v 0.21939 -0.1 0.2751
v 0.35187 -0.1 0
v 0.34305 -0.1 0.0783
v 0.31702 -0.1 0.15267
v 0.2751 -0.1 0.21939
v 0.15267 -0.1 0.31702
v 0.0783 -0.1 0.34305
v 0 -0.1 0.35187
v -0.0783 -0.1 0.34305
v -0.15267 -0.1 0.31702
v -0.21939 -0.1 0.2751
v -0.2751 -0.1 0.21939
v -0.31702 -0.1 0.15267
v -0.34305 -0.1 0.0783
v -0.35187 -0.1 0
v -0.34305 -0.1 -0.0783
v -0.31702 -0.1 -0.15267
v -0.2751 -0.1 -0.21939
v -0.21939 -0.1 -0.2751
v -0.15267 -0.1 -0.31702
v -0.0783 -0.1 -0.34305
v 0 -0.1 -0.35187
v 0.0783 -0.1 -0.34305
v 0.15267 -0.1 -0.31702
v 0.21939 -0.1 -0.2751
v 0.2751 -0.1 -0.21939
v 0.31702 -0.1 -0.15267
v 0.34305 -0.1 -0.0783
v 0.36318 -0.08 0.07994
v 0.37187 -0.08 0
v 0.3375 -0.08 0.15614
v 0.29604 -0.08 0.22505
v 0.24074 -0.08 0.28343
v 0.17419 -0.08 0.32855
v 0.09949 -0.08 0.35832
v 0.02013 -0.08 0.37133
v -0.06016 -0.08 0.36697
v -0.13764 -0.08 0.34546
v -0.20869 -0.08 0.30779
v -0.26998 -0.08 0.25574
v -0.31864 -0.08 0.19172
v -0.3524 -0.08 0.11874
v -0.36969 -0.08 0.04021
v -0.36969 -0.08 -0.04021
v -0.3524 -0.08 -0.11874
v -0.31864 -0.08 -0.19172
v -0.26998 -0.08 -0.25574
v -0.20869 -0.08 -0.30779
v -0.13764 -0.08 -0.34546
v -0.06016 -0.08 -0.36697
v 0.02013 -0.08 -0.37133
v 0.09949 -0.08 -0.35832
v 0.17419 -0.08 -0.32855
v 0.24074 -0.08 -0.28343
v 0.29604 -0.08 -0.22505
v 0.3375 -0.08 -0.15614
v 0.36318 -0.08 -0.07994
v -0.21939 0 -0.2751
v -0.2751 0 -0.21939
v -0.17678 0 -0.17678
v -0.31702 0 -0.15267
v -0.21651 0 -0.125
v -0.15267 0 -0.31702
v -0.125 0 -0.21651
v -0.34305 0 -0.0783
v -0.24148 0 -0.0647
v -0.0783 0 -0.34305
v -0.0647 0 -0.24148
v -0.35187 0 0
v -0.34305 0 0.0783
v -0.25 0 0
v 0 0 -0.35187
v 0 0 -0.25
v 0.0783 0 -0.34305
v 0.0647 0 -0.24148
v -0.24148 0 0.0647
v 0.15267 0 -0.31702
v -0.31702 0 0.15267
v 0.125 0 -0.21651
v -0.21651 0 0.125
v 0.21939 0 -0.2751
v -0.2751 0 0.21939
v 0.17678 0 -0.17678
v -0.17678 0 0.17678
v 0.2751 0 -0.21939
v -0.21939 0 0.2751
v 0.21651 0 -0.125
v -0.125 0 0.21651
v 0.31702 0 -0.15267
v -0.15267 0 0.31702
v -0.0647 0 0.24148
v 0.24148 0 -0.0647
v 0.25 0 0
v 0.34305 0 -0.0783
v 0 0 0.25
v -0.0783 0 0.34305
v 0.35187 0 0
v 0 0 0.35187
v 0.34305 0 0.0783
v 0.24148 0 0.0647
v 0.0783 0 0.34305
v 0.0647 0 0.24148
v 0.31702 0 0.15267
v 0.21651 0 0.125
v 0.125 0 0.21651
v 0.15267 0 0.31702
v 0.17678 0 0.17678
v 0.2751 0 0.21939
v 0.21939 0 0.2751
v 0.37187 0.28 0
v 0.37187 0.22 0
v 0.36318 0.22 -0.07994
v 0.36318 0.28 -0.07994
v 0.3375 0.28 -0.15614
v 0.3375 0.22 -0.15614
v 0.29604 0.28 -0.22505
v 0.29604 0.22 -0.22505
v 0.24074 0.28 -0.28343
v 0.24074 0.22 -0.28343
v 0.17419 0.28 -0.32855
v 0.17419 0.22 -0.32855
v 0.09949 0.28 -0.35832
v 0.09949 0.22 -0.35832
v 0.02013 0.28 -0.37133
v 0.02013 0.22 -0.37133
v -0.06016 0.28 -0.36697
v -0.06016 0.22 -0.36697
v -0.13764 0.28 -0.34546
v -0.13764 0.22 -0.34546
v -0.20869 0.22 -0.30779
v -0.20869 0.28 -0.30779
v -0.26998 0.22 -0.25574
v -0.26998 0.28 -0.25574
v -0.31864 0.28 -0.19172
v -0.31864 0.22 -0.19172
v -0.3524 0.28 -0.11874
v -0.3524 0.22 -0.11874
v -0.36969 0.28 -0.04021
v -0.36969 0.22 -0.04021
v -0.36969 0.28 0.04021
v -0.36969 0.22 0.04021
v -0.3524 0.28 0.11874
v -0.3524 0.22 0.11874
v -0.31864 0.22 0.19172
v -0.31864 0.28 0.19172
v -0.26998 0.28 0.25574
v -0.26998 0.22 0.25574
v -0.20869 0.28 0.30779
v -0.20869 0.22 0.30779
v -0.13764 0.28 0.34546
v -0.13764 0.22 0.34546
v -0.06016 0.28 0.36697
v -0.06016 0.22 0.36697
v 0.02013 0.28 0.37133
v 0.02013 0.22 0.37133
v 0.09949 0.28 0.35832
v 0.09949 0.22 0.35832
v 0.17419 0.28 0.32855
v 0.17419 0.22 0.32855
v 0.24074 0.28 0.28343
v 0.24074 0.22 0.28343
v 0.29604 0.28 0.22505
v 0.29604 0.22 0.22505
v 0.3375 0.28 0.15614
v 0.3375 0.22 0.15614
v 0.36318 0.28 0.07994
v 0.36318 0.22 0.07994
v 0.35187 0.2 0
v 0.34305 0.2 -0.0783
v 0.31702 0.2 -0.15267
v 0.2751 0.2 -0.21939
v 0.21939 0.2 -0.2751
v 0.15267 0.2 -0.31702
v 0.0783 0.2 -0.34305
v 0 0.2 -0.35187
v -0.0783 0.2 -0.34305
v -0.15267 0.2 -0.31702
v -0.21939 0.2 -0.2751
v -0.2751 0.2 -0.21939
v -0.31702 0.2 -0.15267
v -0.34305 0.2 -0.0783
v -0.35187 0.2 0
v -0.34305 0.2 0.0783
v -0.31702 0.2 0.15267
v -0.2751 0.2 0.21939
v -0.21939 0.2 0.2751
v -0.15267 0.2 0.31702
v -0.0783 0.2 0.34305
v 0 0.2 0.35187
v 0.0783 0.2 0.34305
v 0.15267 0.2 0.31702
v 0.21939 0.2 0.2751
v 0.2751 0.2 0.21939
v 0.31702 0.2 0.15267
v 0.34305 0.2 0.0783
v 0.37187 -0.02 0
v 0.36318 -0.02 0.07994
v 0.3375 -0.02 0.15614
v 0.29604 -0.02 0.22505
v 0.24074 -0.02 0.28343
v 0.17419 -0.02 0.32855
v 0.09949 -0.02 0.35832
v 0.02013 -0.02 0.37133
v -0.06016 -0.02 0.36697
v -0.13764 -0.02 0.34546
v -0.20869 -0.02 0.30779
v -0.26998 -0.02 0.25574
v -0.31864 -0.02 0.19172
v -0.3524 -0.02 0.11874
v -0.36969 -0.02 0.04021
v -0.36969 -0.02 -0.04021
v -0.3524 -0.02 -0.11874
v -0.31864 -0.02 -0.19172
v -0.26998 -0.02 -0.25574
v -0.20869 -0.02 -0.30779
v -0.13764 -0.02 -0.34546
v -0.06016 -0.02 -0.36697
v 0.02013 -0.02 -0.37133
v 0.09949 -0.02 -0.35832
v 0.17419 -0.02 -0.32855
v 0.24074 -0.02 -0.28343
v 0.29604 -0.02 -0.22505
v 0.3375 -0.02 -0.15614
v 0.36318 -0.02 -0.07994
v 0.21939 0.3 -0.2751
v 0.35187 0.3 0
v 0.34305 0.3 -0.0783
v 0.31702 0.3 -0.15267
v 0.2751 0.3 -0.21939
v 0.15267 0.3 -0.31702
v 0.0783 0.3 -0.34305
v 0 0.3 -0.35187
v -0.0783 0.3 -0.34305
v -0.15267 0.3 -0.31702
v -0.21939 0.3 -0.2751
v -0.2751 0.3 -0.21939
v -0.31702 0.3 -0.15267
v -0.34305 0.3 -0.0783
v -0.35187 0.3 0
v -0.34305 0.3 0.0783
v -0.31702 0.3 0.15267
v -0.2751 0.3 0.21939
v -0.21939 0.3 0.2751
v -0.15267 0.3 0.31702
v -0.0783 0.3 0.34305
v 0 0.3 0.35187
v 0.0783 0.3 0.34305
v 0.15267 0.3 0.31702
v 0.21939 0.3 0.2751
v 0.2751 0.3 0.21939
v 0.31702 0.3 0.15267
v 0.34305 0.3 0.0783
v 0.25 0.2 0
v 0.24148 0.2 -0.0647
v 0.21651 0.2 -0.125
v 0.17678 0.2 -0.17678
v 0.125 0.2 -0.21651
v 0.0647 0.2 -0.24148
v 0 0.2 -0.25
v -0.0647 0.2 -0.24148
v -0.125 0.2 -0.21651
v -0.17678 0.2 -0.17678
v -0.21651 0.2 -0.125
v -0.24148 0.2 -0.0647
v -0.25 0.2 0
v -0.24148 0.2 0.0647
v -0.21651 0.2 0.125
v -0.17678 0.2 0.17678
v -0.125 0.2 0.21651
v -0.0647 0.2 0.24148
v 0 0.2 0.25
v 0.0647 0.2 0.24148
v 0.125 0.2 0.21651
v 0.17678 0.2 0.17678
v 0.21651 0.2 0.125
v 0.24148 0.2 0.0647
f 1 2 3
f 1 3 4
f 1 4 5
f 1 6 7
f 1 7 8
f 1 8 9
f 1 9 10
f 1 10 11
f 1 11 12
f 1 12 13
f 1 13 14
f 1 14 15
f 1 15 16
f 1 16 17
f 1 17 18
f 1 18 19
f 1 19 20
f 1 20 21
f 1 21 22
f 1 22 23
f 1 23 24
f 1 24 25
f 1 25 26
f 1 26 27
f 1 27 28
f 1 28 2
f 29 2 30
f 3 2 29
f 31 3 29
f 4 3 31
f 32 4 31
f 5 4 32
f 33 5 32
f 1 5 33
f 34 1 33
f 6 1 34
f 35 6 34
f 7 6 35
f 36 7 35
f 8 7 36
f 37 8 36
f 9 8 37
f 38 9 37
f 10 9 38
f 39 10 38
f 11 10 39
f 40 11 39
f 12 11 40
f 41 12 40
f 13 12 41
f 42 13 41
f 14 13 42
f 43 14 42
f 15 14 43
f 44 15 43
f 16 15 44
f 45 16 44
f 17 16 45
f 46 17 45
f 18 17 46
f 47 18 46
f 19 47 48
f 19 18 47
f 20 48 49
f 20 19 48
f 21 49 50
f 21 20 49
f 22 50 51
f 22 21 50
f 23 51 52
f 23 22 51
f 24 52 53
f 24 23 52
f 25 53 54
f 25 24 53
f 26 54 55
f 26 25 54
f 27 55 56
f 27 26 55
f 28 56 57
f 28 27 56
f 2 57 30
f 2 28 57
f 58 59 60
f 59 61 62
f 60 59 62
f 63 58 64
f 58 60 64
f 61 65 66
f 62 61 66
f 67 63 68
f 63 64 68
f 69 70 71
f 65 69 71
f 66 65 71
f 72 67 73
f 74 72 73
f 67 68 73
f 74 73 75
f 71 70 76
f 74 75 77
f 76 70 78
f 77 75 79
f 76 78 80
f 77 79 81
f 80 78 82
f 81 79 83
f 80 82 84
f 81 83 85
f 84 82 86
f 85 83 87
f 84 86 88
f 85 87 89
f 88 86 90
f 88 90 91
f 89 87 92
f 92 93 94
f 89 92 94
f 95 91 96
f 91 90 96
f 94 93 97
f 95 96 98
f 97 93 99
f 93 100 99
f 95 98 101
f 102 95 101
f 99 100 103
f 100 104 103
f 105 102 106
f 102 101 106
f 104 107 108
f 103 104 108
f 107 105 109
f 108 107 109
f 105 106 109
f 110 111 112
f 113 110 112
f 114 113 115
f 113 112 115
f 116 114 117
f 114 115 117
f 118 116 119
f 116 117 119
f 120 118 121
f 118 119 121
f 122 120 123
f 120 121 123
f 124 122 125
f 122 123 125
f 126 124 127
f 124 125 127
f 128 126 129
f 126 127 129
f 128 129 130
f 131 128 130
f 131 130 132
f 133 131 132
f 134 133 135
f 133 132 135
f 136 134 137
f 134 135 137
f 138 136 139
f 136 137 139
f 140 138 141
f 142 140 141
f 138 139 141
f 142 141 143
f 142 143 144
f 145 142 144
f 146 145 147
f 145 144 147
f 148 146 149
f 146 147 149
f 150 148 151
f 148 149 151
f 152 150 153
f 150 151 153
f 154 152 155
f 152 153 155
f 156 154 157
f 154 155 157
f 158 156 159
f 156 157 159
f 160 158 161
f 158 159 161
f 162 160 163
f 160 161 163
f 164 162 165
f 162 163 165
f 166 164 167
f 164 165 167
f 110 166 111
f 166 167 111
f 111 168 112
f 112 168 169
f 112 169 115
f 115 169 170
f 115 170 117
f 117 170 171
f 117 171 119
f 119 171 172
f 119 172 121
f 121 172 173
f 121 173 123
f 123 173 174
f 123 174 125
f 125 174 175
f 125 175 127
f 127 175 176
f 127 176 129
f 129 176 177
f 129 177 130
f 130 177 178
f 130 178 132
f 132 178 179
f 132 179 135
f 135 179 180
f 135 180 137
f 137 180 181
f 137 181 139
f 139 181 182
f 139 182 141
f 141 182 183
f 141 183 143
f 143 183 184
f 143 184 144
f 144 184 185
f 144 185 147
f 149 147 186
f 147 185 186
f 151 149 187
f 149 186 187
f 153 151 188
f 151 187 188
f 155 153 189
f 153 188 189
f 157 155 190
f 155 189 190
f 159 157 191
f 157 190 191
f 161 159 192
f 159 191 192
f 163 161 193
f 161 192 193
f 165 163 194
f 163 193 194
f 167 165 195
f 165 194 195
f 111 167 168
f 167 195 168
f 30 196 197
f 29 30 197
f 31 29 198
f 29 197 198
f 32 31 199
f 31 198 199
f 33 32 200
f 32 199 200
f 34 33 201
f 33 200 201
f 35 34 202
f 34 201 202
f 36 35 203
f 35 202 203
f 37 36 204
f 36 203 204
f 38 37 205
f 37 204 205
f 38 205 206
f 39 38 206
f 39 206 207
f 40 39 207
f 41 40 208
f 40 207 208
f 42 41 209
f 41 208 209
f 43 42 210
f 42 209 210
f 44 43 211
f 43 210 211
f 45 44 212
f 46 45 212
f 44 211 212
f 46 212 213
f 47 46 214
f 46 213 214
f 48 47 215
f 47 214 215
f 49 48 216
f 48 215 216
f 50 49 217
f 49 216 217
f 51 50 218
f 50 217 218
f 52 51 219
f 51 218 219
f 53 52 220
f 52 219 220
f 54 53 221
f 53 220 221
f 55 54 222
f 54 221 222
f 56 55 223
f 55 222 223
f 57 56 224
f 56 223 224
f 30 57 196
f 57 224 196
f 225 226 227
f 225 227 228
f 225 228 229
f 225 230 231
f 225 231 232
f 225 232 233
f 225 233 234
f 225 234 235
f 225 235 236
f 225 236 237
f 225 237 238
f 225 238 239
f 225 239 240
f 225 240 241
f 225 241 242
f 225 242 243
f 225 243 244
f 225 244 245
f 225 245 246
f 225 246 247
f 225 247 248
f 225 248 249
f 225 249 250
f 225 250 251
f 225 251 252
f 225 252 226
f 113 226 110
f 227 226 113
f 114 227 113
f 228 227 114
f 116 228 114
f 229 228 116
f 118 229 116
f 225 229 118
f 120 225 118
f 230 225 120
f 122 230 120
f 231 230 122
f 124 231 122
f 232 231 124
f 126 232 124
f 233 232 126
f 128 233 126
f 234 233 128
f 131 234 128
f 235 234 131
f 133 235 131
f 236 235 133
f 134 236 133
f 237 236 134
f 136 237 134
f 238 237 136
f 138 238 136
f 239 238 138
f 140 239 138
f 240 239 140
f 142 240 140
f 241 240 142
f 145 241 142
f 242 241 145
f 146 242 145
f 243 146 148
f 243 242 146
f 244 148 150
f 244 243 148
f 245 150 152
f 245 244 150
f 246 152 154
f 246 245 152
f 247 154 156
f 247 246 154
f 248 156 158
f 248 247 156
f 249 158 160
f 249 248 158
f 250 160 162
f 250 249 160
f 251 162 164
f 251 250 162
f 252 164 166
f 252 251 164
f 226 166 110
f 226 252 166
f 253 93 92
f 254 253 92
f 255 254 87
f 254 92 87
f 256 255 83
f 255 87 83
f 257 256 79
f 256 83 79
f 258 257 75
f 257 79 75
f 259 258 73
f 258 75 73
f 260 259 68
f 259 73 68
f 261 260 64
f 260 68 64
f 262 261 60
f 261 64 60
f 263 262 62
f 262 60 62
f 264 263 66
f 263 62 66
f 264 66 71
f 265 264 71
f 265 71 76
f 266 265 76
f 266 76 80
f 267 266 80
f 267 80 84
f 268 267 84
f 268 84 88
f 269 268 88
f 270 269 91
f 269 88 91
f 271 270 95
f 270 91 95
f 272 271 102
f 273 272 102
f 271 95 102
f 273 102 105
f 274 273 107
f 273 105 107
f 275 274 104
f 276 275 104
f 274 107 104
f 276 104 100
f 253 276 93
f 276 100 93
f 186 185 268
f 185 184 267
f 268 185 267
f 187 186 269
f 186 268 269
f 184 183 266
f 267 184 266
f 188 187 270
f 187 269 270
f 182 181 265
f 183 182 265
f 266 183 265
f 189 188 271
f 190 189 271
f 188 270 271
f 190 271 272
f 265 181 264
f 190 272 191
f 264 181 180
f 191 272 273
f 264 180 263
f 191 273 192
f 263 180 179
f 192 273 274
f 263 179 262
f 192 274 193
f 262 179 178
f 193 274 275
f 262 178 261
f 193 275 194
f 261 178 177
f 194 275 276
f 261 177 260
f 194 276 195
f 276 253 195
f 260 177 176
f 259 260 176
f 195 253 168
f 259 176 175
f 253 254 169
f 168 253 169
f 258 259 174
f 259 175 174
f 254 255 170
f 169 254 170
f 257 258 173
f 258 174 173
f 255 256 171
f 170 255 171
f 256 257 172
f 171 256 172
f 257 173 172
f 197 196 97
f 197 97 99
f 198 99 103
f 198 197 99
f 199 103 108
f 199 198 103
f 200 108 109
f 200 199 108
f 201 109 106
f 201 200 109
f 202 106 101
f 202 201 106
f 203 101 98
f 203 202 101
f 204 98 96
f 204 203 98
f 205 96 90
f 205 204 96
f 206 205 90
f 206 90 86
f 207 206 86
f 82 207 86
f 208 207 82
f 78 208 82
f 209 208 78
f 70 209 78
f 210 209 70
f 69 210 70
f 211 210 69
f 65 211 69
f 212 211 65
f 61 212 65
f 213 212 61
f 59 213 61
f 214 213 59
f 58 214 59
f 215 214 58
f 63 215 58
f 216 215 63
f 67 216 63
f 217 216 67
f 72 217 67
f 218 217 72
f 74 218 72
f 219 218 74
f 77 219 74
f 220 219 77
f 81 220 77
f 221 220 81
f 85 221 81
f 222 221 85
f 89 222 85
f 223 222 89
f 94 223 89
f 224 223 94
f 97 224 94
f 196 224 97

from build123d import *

# Parameters (mm, degrees)
SKETCH2_R           = 0.25
BOSS_EXTRUDE1_DEPTH = 0.2
SKETCH3_R           = 0.371871199
BOSS_EXTRUDE2_DEPTH = 0.1
SKETCH4_R           = 0.371871199
BOSS_EXTRUDE3_DEPTH = 0.1
CHAMFER1_SIZE       = 0.02
CHAMFER2_SIZE       = 0.02
CHAMFER3_SIZE       = 0.02


with BuildPart() as part:
    # Sketch2 → Boss-Extrude1 (new body)
    with BuildSketch(Plane(origin=(0, 0, 0), x_dir=(1, 0, 0), z_dir=(0, 1, 0))):
        Circle(SKETCH2_R)
    extrude(amount=BOSS_EXTRUDE1_DEPTH)

    # Sketch3 → Boss-Extrude2 (add)
    with BuildSketch(Plane(origin=(0, 0.2, 0), x_dir=(1, 0, 0), z_dir=(0, 1, 0))):
        Circle(SKETCH3_R)
    extrude(amount=BOSS_EXTRUDE2_DEPTH)

    # Sketch4 → Boss-Extrude3 (add)
    with BuildSketch(Plane.XZ):
        Circle(SKETCH4_R)
    extrude(amount=BOSS_EXTRUDE3_DEPTH)

    # Chamfer1
    chamfer1_edges = [part.edges().sort_by_distance(p)[0] for p in [
        (-0.371871199, 0.3, 0),
    ]]
    chamfer(chamfer1_edges, length=CHAMFER1_SIZE)

    # Chamfer2
    chamfer2_edges = [part.edges().sort_by_distance(p)[0] for p in [
        (-0.371871199, 0.2, 0),
        (-0.371871199, 0, 0),
    ]]
    chamfer(chamfer2_edges, length=CHAMFER2_SIZE)

    # Chamfer3
    chamfer3_edges = [part.edges().sort_by_distance(p)[0] for p in [
        (-0.371871199, -0.1, 0),
    ]]
    chamfer(chamfer3_edges, length=CHAMFER3_SIZE)


solid = part.part
